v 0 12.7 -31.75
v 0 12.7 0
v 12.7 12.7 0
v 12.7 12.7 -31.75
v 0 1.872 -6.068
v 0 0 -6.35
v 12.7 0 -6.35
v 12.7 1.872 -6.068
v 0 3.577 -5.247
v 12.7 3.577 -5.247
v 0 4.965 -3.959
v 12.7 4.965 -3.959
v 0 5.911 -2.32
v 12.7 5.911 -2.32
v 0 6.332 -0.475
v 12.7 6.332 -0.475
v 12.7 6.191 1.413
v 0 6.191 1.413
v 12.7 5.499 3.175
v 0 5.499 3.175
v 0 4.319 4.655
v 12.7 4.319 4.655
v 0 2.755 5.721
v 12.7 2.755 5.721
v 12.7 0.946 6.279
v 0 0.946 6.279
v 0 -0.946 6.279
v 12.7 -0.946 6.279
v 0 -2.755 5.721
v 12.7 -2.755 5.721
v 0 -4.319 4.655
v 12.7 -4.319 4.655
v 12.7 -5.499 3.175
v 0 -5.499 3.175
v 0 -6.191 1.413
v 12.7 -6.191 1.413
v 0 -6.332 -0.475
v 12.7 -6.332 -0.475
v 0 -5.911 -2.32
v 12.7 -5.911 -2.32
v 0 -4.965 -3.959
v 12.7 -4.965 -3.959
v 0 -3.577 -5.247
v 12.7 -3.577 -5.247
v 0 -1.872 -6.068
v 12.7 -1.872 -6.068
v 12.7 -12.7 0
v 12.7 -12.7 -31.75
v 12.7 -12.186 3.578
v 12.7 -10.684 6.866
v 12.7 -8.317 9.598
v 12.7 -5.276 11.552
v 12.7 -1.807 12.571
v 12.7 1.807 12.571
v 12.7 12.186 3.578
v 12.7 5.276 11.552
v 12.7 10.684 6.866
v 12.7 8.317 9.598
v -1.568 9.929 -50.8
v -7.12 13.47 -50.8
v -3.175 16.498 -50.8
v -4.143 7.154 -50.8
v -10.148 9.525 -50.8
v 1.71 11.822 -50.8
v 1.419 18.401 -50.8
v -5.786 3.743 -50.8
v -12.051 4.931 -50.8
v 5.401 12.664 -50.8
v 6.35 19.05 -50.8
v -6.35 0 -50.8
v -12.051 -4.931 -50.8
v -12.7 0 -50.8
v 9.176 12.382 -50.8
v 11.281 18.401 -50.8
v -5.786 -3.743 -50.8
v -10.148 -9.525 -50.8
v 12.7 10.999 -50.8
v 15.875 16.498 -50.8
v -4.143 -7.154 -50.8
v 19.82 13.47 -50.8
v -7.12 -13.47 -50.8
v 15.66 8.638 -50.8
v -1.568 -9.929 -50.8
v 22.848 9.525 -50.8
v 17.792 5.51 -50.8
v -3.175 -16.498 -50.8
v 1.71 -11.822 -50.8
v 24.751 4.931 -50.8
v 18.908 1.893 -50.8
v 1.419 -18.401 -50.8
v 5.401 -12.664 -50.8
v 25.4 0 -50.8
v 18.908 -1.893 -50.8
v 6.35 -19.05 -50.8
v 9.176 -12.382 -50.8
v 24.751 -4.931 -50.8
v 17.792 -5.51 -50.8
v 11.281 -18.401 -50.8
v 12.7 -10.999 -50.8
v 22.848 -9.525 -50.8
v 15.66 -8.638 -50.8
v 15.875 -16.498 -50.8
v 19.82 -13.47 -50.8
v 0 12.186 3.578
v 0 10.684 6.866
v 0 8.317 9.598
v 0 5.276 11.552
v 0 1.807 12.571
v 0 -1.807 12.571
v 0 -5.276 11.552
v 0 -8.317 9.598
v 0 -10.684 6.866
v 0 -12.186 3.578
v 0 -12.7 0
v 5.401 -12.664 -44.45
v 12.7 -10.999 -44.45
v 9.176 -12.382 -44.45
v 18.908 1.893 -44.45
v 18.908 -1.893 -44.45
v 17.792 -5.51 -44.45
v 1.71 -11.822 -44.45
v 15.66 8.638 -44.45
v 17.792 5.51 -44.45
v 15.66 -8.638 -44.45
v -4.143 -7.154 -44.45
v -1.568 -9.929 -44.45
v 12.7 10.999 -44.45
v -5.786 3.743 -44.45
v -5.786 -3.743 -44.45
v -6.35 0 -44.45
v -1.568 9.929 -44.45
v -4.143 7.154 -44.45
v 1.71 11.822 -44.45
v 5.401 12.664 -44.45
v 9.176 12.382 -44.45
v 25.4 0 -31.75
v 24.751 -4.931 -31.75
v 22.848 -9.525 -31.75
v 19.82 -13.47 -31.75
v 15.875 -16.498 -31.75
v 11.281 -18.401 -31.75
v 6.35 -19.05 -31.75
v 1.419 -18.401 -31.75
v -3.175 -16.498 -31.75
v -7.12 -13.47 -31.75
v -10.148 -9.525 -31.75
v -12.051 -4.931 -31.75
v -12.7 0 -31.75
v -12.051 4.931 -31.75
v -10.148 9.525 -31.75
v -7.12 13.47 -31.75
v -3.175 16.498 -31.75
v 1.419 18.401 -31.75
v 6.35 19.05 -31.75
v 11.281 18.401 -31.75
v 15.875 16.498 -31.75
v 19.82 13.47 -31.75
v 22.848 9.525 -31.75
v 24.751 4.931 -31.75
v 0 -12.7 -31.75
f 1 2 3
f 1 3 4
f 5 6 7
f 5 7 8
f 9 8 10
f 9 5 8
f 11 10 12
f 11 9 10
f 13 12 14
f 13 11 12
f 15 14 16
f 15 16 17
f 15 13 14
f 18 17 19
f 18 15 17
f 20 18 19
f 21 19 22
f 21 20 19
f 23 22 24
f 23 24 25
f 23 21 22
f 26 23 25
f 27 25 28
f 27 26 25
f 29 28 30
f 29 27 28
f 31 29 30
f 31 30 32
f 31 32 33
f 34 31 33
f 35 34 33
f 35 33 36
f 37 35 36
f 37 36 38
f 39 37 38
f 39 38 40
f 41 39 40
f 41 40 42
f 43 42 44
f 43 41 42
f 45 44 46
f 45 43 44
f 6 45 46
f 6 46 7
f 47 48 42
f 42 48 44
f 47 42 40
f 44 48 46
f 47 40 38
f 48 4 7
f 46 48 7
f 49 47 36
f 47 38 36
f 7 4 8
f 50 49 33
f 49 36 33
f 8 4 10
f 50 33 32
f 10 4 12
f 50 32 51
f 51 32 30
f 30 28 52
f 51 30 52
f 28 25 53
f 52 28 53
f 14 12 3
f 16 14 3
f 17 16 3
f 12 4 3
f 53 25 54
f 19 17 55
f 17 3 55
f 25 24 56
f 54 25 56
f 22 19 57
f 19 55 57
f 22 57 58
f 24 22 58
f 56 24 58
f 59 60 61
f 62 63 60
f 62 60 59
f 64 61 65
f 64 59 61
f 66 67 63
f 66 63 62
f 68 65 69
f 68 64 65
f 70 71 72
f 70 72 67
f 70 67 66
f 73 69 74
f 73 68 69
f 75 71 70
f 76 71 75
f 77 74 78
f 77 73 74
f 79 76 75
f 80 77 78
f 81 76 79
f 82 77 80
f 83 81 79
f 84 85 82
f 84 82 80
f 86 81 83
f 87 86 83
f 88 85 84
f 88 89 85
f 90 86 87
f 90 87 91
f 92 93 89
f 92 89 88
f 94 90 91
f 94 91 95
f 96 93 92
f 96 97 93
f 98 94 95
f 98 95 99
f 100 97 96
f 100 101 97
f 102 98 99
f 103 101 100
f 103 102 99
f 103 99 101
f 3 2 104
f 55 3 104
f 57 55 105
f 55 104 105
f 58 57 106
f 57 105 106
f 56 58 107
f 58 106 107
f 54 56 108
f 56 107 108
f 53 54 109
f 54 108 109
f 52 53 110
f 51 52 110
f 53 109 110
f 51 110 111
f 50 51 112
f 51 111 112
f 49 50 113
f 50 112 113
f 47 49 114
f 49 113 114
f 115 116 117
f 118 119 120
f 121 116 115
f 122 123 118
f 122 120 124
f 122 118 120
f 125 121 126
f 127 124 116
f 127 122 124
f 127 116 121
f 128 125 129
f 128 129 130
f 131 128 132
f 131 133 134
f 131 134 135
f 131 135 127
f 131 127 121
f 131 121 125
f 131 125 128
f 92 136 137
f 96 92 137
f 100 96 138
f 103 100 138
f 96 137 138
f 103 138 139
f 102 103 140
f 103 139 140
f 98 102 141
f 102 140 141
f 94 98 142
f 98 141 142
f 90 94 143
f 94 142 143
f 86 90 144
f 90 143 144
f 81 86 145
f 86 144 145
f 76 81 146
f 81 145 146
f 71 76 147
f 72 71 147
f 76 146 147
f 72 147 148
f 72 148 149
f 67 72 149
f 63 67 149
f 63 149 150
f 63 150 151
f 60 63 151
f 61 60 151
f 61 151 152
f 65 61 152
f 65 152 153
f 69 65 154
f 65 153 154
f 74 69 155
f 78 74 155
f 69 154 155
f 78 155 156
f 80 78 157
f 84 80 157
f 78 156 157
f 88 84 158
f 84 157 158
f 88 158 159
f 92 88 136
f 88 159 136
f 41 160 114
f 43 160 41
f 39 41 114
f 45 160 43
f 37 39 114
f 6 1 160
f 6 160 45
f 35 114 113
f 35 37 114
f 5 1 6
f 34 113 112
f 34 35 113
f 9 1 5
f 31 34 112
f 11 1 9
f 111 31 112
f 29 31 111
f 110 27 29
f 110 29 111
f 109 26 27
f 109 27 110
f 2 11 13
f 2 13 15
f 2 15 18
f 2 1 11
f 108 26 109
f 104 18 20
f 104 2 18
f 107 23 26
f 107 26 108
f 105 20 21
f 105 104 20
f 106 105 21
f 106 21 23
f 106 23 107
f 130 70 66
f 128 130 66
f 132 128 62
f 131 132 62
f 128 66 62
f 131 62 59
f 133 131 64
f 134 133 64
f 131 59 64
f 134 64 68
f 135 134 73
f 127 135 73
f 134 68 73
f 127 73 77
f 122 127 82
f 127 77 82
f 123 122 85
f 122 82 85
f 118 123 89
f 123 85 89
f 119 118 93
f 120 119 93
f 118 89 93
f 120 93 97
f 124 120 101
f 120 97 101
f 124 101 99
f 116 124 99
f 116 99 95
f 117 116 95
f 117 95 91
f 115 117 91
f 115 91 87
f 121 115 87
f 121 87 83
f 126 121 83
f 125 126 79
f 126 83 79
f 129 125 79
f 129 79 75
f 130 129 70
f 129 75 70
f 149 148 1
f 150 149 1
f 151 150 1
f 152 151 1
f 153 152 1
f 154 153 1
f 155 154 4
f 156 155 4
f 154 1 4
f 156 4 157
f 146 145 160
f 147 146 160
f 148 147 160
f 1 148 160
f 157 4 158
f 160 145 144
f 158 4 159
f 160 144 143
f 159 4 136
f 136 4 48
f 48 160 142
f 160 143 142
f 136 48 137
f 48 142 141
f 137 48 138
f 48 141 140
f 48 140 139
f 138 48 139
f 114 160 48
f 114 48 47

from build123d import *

# Parameters (mm, degrees)
SKETCH1_R           = 12.7
SKETCH1_R_2         = 6.35
EXTRUDE_THIN1_DEPTH = 12.7
BOSS_EXTRUDE1_START = -12.7
BOSS_EXTRUDE1_DEPTH = 12.7
SKETCH3_R           = 19.05
BOSS_EXTRUDE2_DEPTH = 19.05
SKETCH4_R           = 12.7
CUT_EXTRUDE1_DEPTH  = 6.35


with BuildPart() as part:
    # Sketch1 → Extrude-Thin1 (new body)
    with BuildSketch(Plane(origin=(0, 0, 0), x_dir=(0, 0, -1), z_dir=(1, 0, 0))):
        Circle(SKETCH1_R)
        Circle(SKETCH1_R_2, mode=Mode.SUBTRACT)
    extrude(amount=EXTRUDE_THIN1_DEPTH)

    # Sketch2 → Boss-Extrude1 (add)
    with BuildSketch(Plane(origin=(12.7, 0, 0), x_dir=(0, 0, -1), z_dir=(1, 0, 0)).offset(BOSS_EXTRUDE1_START)):
        with BuildLine():
            Line((0, 12.7), (31.75, 12.7))
            Line((31.75, 12.7), (31.75, -12.7))
            Line((31.75, -12.7), (0, -12.7))
            ThreePointArc((0, -12.7), (12.7, 0), (0, 12.7))
        make_face()
    extrude(amount=BOSS_EXTRUDE1_DEPTH)

    # Sketch3 → Boss-Extrude2 (add)
    with BuildSketch(Plane(origin=(0, 0, -31.75), x_dir=(-1, 0, 0), z_dir=(0, 0, -1))):
        with Locations(Location((-6.35, 0, 0), (0, 0, 180))):
            Circle(SKETCH3_R)
    extrude(amount=BOSS_EXTRUDE2_DEPTH)

    # Sketch4 → Cut-Extrude1 (cut)
    with BuildSketch(Plane(origin=(0, 0, -50.8), x_dir=(-1, 0, 0), z_dir=(0, 0, -1))):
        with Locations((-6.35, 0)):
            Circle(SKETCH4_R)
    extrude(amount=-CUT_EXTRUDE1_DEPTH, mode=Mode.SUBTRACT)


solid = part.part
